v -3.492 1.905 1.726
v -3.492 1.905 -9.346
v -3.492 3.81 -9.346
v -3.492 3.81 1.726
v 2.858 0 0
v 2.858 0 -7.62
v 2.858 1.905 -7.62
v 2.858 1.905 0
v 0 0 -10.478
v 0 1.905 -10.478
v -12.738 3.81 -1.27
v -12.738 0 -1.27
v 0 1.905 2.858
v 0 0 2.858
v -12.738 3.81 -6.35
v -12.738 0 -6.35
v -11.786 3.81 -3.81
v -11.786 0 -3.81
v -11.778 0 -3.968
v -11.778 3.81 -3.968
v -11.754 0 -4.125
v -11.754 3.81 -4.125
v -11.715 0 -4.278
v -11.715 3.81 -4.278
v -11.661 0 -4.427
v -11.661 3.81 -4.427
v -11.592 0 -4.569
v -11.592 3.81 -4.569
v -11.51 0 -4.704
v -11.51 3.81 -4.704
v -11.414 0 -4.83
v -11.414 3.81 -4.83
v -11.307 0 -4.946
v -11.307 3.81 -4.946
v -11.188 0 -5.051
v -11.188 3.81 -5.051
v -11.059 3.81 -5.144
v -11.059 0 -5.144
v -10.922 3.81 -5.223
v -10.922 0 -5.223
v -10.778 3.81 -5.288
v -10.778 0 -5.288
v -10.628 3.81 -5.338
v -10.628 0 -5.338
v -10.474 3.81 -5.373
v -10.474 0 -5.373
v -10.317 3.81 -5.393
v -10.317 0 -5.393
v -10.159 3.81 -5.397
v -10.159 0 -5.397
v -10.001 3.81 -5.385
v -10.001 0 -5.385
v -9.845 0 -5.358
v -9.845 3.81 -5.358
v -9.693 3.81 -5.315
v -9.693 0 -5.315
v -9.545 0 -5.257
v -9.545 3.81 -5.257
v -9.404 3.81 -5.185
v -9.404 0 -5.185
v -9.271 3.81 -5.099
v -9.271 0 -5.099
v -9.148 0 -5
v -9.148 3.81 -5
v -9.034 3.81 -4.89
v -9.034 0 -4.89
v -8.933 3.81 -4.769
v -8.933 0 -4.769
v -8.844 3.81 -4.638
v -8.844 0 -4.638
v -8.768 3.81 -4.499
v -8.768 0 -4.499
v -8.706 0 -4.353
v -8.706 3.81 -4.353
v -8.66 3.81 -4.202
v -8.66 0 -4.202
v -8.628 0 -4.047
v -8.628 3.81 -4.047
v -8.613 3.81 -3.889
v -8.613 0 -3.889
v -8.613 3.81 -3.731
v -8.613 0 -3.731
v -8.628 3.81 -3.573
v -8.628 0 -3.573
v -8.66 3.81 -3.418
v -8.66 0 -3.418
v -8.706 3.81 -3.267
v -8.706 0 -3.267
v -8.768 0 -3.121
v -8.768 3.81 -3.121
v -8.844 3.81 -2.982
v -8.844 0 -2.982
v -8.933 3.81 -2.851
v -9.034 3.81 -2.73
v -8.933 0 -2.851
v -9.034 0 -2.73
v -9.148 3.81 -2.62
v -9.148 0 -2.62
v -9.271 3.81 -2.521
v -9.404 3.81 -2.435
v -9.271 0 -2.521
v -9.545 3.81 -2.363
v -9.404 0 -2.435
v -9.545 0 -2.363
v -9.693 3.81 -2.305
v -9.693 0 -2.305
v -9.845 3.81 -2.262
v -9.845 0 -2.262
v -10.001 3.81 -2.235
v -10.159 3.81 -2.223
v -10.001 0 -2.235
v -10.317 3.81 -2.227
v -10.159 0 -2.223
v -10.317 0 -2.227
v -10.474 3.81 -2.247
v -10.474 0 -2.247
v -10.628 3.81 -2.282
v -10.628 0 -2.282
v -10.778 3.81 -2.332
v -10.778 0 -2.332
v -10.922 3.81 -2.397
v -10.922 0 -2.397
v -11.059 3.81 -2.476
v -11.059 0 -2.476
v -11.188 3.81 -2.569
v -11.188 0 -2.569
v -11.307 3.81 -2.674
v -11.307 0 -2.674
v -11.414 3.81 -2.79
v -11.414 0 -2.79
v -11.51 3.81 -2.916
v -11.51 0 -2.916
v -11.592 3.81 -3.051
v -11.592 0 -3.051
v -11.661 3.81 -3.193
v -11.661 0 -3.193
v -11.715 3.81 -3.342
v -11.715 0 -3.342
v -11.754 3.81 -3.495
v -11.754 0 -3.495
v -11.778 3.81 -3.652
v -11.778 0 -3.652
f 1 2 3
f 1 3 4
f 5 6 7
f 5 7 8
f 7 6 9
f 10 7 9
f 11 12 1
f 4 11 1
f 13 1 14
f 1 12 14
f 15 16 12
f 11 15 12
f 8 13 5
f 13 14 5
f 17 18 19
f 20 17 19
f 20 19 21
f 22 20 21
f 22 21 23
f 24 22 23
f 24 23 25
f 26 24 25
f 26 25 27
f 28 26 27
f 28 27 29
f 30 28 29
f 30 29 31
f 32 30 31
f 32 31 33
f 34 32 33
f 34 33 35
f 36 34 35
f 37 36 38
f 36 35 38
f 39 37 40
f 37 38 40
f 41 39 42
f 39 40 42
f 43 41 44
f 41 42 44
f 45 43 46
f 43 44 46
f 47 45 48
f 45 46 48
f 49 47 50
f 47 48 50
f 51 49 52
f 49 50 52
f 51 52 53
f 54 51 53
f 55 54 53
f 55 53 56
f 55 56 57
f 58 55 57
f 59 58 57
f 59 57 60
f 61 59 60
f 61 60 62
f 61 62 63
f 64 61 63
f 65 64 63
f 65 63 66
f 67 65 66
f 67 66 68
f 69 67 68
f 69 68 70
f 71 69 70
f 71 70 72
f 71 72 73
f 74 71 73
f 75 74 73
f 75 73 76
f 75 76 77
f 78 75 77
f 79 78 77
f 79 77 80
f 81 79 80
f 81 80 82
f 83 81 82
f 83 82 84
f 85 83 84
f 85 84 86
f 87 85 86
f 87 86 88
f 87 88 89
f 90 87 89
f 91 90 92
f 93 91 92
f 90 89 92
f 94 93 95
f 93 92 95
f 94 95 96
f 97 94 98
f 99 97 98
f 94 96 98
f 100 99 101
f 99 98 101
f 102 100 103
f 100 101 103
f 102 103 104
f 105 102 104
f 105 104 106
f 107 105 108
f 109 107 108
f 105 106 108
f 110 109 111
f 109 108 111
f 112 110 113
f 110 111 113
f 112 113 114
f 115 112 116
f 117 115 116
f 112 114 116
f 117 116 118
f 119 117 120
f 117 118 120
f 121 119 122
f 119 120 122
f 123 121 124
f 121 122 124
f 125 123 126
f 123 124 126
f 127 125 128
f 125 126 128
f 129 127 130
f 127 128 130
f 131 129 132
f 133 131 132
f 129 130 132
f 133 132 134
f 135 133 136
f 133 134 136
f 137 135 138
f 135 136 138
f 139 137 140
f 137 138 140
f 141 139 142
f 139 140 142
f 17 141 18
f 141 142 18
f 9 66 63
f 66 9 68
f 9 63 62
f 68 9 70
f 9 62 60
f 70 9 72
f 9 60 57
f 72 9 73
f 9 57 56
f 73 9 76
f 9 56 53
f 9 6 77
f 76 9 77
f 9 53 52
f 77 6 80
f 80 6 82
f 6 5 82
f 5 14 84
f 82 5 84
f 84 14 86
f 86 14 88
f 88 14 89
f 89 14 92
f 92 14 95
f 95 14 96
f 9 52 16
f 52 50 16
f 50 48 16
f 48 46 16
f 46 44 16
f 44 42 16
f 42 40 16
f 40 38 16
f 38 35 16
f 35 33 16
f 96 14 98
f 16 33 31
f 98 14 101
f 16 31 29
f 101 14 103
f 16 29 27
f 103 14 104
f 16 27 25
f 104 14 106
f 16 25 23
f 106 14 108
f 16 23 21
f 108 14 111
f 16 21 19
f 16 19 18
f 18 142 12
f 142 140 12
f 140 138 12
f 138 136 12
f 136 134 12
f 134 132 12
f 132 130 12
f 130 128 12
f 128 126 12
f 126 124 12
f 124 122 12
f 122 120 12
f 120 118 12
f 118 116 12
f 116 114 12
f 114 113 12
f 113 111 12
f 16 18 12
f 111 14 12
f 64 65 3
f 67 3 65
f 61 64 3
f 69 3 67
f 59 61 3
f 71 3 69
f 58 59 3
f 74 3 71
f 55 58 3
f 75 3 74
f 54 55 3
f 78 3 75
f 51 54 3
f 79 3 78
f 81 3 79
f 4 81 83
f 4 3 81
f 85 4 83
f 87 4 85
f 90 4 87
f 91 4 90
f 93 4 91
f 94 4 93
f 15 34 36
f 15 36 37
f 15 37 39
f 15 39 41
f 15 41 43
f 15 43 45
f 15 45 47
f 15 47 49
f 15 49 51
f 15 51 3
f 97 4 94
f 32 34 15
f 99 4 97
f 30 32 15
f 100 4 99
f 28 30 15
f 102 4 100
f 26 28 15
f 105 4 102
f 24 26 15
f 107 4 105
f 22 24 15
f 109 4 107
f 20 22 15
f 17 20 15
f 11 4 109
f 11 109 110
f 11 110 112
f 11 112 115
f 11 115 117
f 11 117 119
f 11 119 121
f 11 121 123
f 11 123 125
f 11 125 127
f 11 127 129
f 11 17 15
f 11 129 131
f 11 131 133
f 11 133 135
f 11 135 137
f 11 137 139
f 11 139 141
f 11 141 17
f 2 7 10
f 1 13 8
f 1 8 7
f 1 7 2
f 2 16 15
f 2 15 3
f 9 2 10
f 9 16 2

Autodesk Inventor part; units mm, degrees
ref_plane "YZ Plane" through (0, 0, 0) normal (1, 0, 0) x (0, 1, 0)
ref_plane "XZ Plane" through (0, 0, 0) normal (0, 1, 0) x (-1, 0, 0)
sketch "Sketch1" plane through (0, 0, 0) normal (0, 1, 0) x (-1, 0, 0)
  circle A0 centre (0, 0) radius 1.5875
  line L0 (0, 0) -> (0, -7.62)
  circle A1 centre (0, -7.62) radius 1.5875
  line L1 (-14.0081, -3.81) -> (-6.6675, -3.81)
  circle A2 centre (10.1981, -3.81) radius 1.5875
  line L2 (10.1981, -3.81) -> (10.1981, -6.35)
  line L3 (10.1981, -6.35) -> (10.1981, -1.27)
  line L4 (0, 1.5875) -> (0, 2.8575)
  line L5 (-1.5875, 0) -> (-2.8575, 0)
  line L6 (0, -9.2075) -> (0, -10.4775)
  line L7 (-1.5875, -7.62) -> (-2.8575, -7.62)
  line L8 (-2.8575, -7.62) -> (-2.8575, 0)
  line L9 (0, 2.8575) -> (-2.8575, 0)
  line L10 (0, 2.8575) -> (3.4925, 1.444)
  line L11 (3.4925, -9.064) -> (0, -10.4775)
  line L12 (-2.8575, -7.62) -> (0, -10.4775)
  line L13 (-2.8575, -3.81) -> (0, -3.81)
  line L14 (3.4925, -3.81) -> (3.4925, -9.064)
  line L15 (3.4925, -3.81) -> (3.4925, 1.444)
  line L16 (10.1981, -3.81) -> (12.7381, -3.81)
  line L17 (12.7381, -3.81) -> (12.7381, -6.35)
  line L18 (12.7381, -6.35) -> (10.1981, -6.35)
  line L19 (12.7381, -3.81) -> (12.7381, -1.27)
  line L20 (12.7381, -1.27) -> (10.1981, -1.27)
  line L21 (12.7381, -6.35) -> (0, -10.4775)
  line L22 (12.7381, -1.27) -> (0, 2.8575)
  line L23 (10.1981, -3.81) -> (12.7381, -3.81)
  line L24 (3.4925, 1.444) -> (3.4925, 1.7258)
  line L25 (3.4925, -9.064) -> (3.4925, -9.3458)
  dimension "d0" = 3.175
  dimension "d1" = 7.62
  dimension "d2" = 3.175
  dimension "d3" = 7.3406
  dimension "d4" = 3.175
  dimension "d7" = 5.08
  dimension "d8" = 1.27
  dimension "d9" = 1.27
  dimension "d10" = 1.27
  dimension "d11" = 1.27
  dimension "d12" = 6.35
  dimension "d44" = 2.54
ref_plane "Work Plane2" through (2.8575, 0, 0) normal (0.7071, 0, 0.7071) x (0.7071, 0, -0.7071)
sketch "Sketch3" plane through (2.8575, 0, 0) normal (0.7071, 0, 0.7071) x (0.7071, 0, -0.7071)
  point P0 (-2.0206, 0)
extrude "Extrusion4" add sketch "Sketch1" along normal blind 1.905 contours A0 L4 L10 L15 L14 L11 L6 A1 L0 | A0 L5 L9 L4 | L0 L13 L8 L5 A0 | L22 L24 L10 | L0 A1 L7 L8 L13 | A1 L6 L12 L7 | L25 L21 L11
extrude "Extrusion5" add sketch "Sketch1" along normal blind 3.81 contours L24 L22 L20 L3 A2 L2 L18 L21 L25 L14 L15 | L19 L16 A2 L3 L20 | L17 L18 L2 A2 L16
extrude "Extrusion6" add sketch "Sketch1" along normal blind 1.905 contours A0 | A1
properties part number "rollertriangle(v3)"
